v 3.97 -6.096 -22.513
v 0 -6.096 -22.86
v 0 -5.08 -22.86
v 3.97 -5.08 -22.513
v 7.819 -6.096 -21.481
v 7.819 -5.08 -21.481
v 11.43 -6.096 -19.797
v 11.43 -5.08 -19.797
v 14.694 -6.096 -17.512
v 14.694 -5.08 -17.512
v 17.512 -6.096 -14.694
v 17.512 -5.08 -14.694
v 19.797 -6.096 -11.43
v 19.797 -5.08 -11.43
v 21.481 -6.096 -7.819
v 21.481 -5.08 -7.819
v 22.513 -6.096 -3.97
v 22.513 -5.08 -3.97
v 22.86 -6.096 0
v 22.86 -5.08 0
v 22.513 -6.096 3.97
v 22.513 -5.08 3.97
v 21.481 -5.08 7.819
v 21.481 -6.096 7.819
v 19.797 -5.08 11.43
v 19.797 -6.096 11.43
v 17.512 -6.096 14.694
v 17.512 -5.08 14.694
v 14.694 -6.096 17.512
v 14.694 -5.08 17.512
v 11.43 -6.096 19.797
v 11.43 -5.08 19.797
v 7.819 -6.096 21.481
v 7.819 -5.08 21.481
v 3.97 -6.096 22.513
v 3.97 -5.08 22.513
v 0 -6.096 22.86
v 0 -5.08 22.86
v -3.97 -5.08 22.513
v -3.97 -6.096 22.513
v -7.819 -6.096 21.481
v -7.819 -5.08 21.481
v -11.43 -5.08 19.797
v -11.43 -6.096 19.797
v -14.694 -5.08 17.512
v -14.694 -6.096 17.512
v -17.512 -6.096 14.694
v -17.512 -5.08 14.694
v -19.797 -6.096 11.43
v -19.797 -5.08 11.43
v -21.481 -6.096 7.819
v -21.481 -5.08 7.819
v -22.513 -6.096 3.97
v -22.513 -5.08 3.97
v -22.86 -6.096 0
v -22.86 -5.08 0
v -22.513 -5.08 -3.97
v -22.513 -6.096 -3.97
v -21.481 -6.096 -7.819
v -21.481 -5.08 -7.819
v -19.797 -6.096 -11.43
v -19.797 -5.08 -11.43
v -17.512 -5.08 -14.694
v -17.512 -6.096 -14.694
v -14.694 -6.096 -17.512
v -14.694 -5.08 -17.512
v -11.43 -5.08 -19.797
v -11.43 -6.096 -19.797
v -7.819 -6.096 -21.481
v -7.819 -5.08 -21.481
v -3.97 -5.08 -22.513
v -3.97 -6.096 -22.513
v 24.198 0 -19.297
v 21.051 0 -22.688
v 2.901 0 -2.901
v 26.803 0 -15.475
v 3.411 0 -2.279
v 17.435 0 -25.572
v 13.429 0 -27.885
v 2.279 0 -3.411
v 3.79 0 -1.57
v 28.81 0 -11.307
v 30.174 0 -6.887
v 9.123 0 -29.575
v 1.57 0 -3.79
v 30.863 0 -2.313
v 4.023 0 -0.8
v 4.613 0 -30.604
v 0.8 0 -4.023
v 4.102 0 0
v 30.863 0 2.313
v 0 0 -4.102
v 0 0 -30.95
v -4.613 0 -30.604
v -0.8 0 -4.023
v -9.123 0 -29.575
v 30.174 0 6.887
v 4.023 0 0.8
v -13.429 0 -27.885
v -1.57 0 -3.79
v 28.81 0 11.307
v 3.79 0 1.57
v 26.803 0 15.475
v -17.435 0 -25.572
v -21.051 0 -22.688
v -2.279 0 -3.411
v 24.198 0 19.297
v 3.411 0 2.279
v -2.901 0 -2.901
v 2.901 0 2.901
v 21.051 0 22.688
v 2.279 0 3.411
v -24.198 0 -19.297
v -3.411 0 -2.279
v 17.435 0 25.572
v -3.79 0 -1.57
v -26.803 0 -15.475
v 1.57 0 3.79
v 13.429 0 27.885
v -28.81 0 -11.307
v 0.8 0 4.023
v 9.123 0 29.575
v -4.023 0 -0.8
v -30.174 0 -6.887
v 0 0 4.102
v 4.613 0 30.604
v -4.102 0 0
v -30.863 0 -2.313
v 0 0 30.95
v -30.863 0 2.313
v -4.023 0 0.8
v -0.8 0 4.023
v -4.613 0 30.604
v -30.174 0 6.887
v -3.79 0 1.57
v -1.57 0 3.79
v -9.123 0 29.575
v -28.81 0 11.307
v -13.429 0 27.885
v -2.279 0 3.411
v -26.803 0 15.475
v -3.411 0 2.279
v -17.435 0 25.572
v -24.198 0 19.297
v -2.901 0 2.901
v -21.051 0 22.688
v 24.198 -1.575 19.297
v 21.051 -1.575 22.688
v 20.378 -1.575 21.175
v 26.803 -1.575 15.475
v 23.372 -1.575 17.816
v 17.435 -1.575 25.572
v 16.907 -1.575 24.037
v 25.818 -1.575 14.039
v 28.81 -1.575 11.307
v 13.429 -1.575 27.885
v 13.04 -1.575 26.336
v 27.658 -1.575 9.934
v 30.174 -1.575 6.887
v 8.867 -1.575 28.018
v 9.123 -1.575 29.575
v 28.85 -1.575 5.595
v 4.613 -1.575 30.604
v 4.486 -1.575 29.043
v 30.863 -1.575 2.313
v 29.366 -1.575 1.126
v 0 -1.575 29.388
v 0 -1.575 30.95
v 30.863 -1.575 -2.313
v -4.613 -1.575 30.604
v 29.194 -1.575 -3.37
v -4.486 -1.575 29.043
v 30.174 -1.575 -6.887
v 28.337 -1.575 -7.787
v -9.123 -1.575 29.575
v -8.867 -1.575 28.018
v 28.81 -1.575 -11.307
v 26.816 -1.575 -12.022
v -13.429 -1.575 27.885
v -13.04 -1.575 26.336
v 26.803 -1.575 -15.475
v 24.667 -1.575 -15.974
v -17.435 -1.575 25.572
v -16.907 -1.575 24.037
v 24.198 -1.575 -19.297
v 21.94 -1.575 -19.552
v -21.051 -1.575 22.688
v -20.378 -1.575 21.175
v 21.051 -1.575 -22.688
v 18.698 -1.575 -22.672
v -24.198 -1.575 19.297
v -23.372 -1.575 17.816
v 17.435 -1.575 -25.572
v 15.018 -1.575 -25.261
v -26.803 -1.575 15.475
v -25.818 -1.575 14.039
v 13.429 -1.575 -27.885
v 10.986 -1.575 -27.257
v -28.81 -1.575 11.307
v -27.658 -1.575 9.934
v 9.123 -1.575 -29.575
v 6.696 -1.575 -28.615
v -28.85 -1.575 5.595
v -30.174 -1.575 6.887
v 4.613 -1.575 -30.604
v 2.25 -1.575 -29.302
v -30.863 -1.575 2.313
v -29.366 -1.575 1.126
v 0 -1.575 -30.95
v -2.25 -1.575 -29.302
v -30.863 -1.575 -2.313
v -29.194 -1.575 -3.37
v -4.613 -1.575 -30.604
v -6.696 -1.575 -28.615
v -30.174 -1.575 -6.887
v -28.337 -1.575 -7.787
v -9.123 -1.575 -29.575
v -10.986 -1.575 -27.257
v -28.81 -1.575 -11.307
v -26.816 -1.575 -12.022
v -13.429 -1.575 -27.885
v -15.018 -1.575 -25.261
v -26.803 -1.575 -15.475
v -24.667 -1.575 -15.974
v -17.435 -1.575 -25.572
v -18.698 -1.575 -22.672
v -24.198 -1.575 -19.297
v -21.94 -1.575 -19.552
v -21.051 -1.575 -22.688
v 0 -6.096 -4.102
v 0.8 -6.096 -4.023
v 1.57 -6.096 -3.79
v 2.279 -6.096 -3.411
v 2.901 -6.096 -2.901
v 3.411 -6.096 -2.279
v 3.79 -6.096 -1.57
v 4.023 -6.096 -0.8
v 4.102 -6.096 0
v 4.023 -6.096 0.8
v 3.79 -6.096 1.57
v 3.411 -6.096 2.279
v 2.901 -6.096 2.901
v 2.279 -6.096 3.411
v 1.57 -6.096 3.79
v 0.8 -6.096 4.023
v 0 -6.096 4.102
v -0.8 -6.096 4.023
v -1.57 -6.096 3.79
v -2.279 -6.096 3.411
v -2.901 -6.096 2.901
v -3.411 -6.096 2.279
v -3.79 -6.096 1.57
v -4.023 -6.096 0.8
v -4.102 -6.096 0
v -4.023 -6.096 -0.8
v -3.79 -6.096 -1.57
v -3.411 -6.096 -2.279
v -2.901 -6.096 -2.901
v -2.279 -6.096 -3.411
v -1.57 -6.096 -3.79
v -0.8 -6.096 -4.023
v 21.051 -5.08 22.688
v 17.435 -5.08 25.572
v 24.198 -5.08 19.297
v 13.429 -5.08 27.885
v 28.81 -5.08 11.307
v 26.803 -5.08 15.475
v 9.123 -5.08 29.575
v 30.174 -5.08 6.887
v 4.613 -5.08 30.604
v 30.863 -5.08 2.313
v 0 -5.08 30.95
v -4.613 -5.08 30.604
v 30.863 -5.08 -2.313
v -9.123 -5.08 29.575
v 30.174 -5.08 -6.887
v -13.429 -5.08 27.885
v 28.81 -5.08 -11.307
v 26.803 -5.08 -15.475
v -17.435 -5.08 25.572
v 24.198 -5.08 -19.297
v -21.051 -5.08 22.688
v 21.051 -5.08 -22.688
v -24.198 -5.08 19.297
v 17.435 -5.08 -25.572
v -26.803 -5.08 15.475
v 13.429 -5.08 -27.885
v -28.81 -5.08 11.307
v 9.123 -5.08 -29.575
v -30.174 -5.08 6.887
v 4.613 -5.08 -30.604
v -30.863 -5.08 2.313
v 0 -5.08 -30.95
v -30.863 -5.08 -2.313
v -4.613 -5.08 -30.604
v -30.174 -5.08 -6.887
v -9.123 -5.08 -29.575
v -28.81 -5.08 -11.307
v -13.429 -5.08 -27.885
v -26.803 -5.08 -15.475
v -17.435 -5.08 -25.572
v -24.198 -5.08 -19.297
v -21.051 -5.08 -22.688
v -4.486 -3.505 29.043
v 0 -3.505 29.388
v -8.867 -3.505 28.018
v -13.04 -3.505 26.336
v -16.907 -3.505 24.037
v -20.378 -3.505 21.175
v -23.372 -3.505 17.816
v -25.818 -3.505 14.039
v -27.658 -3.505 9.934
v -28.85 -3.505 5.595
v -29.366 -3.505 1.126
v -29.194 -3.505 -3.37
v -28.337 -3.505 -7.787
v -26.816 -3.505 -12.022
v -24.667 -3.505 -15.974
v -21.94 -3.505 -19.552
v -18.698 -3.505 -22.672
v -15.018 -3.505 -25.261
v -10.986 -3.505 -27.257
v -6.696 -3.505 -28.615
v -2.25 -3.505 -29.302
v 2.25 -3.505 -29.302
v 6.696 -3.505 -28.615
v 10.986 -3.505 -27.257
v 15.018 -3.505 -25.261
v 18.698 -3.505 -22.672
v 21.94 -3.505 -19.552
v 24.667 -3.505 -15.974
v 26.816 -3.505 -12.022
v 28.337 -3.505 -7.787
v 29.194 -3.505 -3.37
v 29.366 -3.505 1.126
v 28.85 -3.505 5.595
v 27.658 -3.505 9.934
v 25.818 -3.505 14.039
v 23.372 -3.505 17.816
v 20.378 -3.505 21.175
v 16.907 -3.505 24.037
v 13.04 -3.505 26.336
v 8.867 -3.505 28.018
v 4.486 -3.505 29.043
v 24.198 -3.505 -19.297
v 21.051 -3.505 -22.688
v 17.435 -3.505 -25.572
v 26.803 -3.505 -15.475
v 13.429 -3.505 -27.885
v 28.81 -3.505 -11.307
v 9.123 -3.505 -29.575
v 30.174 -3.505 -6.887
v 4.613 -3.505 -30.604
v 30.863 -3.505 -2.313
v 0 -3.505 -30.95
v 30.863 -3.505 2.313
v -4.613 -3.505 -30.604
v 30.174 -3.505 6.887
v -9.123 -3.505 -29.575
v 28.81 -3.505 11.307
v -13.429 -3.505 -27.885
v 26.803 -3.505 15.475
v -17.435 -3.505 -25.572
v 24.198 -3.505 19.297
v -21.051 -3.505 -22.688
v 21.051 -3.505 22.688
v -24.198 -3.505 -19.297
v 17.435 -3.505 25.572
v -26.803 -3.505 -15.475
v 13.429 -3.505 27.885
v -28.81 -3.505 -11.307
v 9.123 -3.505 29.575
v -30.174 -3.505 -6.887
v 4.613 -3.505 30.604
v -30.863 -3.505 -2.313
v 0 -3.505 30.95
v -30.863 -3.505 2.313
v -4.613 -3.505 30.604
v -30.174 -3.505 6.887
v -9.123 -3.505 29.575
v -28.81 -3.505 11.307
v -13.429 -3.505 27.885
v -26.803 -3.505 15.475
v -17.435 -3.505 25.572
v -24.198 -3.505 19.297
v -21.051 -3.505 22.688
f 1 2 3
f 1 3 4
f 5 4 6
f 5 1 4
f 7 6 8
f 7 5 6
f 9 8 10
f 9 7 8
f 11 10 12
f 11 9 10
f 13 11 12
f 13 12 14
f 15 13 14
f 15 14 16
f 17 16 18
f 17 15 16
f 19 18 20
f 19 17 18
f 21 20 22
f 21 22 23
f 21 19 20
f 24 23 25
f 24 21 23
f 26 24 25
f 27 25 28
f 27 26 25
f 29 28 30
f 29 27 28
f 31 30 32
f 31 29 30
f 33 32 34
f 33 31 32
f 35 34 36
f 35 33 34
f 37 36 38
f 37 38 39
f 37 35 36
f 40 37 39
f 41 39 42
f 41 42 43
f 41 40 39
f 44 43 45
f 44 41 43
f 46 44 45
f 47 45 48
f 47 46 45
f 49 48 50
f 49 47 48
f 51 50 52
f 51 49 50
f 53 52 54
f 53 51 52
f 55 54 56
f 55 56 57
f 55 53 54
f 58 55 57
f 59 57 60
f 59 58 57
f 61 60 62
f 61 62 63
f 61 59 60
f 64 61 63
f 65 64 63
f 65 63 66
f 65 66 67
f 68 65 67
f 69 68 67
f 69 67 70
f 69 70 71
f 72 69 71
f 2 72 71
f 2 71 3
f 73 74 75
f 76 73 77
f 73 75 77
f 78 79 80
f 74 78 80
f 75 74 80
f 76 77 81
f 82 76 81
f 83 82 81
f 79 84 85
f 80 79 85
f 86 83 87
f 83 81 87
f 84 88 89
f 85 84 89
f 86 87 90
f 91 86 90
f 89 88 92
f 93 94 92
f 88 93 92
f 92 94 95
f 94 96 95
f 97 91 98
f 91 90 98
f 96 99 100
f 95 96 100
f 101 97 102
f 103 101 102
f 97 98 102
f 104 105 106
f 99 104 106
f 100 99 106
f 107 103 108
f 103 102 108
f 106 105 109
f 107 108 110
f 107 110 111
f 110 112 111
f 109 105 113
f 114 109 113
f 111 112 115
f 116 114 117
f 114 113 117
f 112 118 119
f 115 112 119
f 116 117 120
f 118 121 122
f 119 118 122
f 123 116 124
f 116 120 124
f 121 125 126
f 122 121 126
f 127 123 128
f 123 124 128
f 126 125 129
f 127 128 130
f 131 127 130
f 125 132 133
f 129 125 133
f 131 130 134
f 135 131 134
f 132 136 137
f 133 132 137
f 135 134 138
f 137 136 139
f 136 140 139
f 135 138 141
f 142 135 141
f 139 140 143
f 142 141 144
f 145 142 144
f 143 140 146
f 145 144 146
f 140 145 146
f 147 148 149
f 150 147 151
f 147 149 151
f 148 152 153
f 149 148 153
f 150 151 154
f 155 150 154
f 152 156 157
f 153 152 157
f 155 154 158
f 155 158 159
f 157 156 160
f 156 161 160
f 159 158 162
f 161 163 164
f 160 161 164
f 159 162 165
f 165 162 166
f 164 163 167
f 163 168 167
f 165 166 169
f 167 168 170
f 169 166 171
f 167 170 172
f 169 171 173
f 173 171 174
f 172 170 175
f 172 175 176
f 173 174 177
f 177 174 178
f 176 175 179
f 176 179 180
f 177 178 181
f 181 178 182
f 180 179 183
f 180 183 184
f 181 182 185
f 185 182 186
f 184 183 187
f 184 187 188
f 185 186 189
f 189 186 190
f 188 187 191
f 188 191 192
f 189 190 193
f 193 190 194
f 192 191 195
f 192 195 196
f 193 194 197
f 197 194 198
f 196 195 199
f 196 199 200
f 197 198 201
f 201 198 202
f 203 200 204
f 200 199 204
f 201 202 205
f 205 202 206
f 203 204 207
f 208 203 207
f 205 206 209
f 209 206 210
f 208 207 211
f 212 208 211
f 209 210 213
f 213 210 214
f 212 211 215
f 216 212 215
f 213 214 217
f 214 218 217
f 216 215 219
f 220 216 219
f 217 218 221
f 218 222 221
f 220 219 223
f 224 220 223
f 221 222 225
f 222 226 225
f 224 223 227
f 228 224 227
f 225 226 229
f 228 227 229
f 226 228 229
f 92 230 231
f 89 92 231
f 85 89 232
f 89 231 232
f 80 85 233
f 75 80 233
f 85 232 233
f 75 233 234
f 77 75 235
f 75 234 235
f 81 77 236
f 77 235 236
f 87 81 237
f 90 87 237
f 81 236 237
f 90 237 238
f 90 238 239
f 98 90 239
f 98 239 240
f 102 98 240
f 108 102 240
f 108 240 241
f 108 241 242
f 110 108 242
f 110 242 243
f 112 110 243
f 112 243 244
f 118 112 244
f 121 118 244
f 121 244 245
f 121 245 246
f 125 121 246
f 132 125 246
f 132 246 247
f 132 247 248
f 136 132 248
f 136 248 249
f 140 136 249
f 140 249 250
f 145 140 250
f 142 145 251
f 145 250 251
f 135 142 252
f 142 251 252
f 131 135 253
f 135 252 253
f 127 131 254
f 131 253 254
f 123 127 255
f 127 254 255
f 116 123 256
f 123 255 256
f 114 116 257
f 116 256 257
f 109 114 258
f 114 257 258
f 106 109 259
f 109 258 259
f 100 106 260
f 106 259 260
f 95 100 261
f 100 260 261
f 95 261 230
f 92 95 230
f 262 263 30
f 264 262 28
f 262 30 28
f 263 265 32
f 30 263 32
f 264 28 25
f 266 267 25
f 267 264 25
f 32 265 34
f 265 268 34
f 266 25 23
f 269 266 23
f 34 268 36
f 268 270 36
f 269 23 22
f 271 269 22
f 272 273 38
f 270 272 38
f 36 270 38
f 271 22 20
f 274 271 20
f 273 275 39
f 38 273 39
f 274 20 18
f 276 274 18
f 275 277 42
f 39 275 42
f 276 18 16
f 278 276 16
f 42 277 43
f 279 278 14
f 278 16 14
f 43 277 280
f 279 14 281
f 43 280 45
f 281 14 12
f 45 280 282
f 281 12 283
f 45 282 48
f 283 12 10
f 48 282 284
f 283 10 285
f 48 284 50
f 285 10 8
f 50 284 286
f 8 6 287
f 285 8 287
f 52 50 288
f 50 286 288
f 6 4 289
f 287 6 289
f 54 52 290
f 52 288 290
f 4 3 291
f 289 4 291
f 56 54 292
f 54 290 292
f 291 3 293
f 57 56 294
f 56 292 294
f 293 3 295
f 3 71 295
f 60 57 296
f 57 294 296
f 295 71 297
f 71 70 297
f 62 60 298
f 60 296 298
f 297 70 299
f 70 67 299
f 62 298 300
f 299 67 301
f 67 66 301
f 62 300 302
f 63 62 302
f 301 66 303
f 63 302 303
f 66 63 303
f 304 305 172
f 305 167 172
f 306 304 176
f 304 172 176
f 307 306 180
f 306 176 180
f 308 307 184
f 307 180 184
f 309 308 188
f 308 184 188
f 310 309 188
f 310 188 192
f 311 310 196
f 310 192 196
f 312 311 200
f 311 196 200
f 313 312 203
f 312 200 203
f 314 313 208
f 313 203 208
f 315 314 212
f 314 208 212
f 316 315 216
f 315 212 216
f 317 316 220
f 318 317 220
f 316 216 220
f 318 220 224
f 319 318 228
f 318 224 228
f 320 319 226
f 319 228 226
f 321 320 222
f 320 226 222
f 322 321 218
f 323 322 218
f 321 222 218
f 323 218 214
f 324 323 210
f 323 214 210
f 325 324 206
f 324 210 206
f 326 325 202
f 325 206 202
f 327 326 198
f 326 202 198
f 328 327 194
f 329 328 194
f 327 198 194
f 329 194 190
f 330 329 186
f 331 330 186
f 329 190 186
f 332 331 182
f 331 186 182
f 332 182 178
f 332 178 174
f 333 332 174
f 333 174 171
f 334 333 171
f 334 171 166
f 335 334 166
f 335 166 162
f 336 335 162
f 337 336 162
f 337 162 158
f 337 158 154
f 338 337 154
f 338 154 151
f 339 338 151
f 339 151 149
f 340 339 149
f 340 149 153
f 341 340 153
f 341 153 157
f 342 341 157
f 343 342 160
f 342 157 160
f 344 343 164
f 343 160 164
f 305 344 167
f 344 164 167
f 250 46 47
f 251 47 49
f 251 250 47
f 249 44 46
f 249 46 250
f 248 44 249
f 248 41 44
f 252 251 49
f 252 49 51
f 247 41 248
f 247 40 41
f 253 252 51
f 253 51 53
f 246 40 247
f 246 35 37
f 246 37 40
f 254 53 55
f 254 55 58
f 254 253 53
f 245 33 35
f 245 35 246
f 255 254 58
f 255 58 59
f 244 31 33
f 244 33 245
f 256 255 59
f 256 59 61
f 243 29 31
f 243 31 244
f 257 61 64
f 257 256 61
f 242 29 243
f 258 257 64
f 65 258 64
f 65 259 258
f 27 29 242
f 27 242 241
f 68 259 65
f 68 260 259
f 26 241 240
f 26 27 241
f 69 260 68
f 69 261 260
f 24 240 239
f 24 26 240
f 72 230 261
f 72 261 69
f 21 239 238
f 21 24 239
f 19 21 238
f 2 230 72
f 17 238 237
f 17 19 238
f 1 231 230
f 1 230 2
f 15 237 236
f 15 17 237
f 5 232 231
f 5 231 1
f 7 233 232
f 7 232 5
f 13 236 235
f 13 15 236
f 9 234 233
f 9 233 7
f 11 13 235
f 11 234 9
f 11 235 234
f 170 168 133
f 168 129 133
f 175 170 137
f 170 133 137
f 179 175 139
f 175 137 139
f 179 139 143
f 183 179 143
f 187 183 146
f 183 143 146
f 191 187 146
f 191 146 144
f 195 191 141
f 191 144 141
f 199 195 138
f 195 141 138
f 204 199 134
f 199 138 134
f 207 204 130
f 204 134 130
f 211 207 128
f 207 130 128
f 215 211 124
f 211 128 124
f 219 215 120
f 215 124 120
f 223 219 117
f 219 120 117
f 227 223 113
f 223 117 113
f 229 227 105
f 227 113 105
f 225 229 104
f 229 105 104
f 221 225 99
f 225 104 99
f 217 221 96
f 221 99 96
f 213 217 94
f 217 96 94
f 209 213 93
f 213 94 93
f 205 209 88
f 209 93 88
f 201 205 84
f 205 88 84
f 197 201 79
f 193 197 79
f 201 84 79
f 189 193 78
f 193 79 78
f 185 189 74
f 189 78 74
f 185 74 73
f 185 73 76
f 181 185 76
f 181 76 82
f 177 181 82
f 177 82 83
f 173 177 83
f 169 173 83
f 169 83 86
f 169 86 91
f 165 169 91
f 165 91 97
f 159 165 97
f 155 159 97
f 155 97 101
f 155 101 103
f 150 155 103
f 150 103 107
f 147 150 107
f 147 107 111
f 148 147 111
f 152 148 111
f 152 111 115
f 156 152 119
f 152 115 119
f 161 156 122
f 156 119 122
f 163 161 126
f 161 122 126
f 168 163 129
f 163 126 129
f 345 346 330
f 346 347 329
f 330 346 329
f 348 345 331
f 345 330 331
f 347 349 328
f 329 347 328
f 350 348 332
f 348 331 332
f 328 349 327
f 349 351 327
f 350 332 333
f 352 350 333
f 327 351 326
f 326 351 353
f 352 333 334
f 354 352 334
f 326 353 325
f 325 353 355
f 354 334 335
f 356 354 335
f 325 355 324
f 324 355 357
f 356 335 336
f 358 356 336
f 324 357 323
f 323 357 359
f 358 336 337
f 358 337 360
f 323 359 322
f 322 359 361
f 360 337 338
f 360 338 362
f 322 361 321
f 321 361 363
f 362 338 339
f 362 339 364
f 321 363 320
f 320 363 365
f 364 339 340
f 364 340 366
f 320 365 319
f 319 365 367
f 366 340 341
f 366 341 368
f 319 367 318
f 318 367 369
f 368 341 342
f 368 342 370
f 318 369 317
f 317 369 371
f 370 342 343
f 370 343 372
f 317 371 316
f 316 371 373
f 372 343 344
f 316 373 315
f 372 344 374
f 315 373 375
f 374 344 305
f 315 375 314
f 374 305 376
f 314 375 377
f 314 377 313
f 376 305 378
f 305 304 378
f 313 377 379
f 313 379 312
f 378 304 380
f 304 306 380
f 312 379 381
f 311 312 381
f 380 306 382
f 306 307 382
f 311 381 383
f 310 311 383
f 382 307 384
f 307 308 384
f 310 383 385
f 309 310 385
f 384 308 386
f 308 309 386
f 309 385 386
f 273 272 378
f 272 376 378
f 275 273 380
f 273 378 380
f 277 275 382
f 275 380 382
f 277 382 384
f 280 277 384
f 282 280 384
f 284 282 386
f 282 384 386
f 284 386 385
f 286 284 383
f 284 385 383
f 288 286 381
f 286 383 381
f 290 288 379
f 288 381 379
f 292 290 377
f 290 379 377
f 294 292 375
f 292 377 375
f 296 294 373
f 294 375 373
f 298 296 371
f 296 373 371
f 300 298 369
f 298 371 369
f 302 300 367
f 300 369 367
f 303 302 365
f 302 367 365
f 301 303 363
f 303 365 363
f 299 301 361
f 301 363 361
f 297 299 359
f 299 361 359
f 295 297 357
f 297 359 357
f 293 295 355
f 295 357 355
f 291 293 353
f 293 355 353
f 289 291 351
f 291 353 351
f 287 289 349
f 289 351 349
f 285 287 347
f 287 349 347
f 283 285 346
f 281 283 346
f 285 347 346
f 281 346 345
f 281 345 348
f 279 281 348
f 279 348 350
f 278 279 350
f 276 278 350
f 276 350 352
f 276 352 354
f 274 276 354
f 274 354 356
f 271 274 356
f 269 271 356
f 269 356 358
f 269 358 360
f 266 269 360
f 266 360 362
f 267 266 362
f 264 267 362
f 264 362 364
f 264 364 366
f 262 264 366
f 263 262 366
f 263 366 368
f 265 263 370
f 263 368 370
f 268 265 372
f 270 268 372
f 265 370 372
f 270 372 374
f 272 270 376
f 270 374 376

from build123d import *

# Parameters (mm, degrees)
SKETCH6_R                   = 4.1021
F_5_16_CLOSE_FIT_HOLE_DEPTH = 45.063579292
BOSS_EXTRUDE1_START         = 1.016
SKETCH7_R                   = 22.86
SKETCH7_R_2                 = 4.1021
BOSS_EXTRUDE1_DEPTH         = 1.016


with BuildPart() as part:
    # Sketch1 → Revolve1 (revolve)
    with BuildSketch(Plane(origin=(0, 0, 0), x_dir=(0, 0, -1), z_dir=(1, 0, 0))):
        Polygon((0, 0), (0, -5.08), (-30.9499, -5.08), (-30.9499, -3.5052), (-29.3878, -3.5052), (-29.3878, -1.5748), (-30.9499, -1.5748), (-30.9499, 0), align=None)
    revolve(axis=Axis((0, 0, 0), (0, -1, 0)))

    # Sketch6 → 5/16 Close Fit hole (cut, through all)
    with BuildSketch(Plane.XZ.offset(5.08)):
        with Locations(Location((0, 0, 0), (0, 0, 270))):
            Circle(SKETCH6_R)
    extrude(amount=-F_5_16_CLOSE_FIT_HOLE_DEPTH, mode=Mode.SUBTRACT)

    # Sketch7 → Boss-Extrude1 (add)
    with BuildSketch(Plane.XZ.offset(5.08).offset(BOSS_EXTRUDE1_START)):
        with Locations(Location((0, 0, 0), (0, 0, 270))):
            Circle(SKETCH7_R)
        with Locations(Location((0, 0, 0), (0, 0, 270))):
            Circle(SKETCH7_R_2, mode=Mode.SUBTRACT)
    extrude(amount=-BOSS_EXTRUDE1_DEPTH)


solid = part.part
